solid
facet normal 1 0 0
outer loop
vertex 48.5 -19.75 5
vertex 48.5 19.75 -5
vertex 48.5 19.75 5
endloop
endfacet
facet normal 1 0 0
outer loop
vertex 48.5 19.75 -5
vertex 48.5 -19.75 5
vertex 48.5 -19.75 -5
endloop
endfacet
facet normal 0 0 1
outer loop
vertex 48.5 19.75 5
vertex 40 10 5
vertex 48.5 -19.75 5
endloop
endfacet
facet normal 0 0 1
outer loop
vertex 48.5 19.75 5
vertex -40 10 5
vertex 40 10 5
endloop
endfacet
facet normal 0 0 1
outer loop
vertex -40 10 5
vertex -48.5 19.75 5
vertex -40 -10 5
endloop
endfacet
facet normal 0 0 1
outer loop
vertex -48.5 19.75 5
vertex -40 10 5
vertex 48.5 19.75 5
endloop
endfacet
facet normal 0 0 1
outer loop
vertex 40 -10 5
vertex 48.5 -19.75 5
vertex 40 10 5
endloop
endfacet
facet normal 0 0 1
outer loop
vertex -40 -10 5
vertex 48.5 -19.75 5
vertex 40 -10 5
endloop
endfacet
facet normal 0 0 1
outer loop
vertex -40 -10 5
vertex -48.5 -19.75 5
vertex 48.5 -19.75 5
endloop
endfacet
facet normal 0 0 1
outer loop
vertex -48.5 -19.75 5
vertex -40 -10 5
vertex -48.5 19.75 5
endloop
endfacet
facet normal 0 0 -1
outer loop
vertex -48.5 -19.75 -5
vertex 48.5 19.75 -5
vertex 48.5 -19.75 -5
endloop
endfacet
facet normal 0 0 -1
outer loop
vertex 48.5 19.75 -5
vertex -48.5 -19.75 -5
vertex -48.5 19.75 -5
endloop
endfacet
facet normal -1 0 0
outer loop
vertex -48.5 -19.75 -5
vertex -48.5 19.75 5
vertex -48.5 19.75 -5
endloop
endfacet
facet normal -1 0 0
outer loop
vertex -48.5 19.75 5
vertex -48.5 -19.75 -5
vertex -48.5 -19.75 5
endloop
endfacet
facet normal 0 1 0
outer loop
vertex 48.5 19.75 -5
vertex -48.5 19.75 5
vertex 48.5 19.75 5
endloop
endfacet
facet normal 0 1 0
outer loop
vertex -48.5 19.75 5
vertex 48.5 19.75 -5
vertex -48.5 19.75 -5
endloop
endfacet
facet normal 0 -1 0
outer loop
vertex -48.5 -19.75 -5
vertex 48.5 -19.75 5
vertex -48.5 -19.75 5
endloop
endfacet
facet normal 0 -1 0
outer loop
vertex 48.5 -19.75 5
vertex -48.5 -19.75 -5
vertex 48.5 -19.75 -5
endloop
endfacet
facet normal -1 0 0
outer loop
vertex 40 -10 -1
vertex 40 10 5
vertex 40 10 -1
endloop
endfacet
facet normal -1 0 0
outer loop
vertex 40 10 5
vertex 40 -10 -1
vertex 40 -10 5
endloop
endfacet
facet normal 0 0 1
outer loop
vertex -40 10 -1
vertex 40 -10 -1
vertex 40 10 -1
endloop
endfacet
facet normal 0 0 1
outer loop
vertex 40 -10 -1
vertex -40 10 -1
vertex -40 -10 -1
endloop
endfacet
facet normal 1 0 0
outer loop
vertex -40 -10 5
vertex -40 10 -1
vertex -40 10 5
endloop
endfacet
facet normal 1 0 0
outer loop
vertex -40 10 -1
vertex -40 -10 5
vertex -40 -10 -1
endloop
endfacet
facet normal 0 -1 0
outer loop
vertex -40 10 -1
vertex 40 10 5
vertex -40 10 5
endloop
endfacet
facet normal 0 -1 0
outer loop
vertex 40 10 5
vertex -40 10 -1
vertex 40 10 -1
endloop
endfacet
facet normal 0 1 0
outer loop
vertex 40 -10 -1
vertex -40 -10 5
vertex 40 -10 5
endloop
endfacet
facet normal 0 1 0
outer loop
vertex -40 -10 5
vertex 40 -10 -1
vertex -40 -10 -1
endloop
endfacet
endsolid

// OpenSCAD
module display_module() {
    difference() {
        // Main body of the display
        cube([97, 39.5, 10], center=true);
        
        // Cutout for the display screen
        translate([-40, -10, -1])
            cube([80, 20, 12], center=false);
    }
}

display_module();
